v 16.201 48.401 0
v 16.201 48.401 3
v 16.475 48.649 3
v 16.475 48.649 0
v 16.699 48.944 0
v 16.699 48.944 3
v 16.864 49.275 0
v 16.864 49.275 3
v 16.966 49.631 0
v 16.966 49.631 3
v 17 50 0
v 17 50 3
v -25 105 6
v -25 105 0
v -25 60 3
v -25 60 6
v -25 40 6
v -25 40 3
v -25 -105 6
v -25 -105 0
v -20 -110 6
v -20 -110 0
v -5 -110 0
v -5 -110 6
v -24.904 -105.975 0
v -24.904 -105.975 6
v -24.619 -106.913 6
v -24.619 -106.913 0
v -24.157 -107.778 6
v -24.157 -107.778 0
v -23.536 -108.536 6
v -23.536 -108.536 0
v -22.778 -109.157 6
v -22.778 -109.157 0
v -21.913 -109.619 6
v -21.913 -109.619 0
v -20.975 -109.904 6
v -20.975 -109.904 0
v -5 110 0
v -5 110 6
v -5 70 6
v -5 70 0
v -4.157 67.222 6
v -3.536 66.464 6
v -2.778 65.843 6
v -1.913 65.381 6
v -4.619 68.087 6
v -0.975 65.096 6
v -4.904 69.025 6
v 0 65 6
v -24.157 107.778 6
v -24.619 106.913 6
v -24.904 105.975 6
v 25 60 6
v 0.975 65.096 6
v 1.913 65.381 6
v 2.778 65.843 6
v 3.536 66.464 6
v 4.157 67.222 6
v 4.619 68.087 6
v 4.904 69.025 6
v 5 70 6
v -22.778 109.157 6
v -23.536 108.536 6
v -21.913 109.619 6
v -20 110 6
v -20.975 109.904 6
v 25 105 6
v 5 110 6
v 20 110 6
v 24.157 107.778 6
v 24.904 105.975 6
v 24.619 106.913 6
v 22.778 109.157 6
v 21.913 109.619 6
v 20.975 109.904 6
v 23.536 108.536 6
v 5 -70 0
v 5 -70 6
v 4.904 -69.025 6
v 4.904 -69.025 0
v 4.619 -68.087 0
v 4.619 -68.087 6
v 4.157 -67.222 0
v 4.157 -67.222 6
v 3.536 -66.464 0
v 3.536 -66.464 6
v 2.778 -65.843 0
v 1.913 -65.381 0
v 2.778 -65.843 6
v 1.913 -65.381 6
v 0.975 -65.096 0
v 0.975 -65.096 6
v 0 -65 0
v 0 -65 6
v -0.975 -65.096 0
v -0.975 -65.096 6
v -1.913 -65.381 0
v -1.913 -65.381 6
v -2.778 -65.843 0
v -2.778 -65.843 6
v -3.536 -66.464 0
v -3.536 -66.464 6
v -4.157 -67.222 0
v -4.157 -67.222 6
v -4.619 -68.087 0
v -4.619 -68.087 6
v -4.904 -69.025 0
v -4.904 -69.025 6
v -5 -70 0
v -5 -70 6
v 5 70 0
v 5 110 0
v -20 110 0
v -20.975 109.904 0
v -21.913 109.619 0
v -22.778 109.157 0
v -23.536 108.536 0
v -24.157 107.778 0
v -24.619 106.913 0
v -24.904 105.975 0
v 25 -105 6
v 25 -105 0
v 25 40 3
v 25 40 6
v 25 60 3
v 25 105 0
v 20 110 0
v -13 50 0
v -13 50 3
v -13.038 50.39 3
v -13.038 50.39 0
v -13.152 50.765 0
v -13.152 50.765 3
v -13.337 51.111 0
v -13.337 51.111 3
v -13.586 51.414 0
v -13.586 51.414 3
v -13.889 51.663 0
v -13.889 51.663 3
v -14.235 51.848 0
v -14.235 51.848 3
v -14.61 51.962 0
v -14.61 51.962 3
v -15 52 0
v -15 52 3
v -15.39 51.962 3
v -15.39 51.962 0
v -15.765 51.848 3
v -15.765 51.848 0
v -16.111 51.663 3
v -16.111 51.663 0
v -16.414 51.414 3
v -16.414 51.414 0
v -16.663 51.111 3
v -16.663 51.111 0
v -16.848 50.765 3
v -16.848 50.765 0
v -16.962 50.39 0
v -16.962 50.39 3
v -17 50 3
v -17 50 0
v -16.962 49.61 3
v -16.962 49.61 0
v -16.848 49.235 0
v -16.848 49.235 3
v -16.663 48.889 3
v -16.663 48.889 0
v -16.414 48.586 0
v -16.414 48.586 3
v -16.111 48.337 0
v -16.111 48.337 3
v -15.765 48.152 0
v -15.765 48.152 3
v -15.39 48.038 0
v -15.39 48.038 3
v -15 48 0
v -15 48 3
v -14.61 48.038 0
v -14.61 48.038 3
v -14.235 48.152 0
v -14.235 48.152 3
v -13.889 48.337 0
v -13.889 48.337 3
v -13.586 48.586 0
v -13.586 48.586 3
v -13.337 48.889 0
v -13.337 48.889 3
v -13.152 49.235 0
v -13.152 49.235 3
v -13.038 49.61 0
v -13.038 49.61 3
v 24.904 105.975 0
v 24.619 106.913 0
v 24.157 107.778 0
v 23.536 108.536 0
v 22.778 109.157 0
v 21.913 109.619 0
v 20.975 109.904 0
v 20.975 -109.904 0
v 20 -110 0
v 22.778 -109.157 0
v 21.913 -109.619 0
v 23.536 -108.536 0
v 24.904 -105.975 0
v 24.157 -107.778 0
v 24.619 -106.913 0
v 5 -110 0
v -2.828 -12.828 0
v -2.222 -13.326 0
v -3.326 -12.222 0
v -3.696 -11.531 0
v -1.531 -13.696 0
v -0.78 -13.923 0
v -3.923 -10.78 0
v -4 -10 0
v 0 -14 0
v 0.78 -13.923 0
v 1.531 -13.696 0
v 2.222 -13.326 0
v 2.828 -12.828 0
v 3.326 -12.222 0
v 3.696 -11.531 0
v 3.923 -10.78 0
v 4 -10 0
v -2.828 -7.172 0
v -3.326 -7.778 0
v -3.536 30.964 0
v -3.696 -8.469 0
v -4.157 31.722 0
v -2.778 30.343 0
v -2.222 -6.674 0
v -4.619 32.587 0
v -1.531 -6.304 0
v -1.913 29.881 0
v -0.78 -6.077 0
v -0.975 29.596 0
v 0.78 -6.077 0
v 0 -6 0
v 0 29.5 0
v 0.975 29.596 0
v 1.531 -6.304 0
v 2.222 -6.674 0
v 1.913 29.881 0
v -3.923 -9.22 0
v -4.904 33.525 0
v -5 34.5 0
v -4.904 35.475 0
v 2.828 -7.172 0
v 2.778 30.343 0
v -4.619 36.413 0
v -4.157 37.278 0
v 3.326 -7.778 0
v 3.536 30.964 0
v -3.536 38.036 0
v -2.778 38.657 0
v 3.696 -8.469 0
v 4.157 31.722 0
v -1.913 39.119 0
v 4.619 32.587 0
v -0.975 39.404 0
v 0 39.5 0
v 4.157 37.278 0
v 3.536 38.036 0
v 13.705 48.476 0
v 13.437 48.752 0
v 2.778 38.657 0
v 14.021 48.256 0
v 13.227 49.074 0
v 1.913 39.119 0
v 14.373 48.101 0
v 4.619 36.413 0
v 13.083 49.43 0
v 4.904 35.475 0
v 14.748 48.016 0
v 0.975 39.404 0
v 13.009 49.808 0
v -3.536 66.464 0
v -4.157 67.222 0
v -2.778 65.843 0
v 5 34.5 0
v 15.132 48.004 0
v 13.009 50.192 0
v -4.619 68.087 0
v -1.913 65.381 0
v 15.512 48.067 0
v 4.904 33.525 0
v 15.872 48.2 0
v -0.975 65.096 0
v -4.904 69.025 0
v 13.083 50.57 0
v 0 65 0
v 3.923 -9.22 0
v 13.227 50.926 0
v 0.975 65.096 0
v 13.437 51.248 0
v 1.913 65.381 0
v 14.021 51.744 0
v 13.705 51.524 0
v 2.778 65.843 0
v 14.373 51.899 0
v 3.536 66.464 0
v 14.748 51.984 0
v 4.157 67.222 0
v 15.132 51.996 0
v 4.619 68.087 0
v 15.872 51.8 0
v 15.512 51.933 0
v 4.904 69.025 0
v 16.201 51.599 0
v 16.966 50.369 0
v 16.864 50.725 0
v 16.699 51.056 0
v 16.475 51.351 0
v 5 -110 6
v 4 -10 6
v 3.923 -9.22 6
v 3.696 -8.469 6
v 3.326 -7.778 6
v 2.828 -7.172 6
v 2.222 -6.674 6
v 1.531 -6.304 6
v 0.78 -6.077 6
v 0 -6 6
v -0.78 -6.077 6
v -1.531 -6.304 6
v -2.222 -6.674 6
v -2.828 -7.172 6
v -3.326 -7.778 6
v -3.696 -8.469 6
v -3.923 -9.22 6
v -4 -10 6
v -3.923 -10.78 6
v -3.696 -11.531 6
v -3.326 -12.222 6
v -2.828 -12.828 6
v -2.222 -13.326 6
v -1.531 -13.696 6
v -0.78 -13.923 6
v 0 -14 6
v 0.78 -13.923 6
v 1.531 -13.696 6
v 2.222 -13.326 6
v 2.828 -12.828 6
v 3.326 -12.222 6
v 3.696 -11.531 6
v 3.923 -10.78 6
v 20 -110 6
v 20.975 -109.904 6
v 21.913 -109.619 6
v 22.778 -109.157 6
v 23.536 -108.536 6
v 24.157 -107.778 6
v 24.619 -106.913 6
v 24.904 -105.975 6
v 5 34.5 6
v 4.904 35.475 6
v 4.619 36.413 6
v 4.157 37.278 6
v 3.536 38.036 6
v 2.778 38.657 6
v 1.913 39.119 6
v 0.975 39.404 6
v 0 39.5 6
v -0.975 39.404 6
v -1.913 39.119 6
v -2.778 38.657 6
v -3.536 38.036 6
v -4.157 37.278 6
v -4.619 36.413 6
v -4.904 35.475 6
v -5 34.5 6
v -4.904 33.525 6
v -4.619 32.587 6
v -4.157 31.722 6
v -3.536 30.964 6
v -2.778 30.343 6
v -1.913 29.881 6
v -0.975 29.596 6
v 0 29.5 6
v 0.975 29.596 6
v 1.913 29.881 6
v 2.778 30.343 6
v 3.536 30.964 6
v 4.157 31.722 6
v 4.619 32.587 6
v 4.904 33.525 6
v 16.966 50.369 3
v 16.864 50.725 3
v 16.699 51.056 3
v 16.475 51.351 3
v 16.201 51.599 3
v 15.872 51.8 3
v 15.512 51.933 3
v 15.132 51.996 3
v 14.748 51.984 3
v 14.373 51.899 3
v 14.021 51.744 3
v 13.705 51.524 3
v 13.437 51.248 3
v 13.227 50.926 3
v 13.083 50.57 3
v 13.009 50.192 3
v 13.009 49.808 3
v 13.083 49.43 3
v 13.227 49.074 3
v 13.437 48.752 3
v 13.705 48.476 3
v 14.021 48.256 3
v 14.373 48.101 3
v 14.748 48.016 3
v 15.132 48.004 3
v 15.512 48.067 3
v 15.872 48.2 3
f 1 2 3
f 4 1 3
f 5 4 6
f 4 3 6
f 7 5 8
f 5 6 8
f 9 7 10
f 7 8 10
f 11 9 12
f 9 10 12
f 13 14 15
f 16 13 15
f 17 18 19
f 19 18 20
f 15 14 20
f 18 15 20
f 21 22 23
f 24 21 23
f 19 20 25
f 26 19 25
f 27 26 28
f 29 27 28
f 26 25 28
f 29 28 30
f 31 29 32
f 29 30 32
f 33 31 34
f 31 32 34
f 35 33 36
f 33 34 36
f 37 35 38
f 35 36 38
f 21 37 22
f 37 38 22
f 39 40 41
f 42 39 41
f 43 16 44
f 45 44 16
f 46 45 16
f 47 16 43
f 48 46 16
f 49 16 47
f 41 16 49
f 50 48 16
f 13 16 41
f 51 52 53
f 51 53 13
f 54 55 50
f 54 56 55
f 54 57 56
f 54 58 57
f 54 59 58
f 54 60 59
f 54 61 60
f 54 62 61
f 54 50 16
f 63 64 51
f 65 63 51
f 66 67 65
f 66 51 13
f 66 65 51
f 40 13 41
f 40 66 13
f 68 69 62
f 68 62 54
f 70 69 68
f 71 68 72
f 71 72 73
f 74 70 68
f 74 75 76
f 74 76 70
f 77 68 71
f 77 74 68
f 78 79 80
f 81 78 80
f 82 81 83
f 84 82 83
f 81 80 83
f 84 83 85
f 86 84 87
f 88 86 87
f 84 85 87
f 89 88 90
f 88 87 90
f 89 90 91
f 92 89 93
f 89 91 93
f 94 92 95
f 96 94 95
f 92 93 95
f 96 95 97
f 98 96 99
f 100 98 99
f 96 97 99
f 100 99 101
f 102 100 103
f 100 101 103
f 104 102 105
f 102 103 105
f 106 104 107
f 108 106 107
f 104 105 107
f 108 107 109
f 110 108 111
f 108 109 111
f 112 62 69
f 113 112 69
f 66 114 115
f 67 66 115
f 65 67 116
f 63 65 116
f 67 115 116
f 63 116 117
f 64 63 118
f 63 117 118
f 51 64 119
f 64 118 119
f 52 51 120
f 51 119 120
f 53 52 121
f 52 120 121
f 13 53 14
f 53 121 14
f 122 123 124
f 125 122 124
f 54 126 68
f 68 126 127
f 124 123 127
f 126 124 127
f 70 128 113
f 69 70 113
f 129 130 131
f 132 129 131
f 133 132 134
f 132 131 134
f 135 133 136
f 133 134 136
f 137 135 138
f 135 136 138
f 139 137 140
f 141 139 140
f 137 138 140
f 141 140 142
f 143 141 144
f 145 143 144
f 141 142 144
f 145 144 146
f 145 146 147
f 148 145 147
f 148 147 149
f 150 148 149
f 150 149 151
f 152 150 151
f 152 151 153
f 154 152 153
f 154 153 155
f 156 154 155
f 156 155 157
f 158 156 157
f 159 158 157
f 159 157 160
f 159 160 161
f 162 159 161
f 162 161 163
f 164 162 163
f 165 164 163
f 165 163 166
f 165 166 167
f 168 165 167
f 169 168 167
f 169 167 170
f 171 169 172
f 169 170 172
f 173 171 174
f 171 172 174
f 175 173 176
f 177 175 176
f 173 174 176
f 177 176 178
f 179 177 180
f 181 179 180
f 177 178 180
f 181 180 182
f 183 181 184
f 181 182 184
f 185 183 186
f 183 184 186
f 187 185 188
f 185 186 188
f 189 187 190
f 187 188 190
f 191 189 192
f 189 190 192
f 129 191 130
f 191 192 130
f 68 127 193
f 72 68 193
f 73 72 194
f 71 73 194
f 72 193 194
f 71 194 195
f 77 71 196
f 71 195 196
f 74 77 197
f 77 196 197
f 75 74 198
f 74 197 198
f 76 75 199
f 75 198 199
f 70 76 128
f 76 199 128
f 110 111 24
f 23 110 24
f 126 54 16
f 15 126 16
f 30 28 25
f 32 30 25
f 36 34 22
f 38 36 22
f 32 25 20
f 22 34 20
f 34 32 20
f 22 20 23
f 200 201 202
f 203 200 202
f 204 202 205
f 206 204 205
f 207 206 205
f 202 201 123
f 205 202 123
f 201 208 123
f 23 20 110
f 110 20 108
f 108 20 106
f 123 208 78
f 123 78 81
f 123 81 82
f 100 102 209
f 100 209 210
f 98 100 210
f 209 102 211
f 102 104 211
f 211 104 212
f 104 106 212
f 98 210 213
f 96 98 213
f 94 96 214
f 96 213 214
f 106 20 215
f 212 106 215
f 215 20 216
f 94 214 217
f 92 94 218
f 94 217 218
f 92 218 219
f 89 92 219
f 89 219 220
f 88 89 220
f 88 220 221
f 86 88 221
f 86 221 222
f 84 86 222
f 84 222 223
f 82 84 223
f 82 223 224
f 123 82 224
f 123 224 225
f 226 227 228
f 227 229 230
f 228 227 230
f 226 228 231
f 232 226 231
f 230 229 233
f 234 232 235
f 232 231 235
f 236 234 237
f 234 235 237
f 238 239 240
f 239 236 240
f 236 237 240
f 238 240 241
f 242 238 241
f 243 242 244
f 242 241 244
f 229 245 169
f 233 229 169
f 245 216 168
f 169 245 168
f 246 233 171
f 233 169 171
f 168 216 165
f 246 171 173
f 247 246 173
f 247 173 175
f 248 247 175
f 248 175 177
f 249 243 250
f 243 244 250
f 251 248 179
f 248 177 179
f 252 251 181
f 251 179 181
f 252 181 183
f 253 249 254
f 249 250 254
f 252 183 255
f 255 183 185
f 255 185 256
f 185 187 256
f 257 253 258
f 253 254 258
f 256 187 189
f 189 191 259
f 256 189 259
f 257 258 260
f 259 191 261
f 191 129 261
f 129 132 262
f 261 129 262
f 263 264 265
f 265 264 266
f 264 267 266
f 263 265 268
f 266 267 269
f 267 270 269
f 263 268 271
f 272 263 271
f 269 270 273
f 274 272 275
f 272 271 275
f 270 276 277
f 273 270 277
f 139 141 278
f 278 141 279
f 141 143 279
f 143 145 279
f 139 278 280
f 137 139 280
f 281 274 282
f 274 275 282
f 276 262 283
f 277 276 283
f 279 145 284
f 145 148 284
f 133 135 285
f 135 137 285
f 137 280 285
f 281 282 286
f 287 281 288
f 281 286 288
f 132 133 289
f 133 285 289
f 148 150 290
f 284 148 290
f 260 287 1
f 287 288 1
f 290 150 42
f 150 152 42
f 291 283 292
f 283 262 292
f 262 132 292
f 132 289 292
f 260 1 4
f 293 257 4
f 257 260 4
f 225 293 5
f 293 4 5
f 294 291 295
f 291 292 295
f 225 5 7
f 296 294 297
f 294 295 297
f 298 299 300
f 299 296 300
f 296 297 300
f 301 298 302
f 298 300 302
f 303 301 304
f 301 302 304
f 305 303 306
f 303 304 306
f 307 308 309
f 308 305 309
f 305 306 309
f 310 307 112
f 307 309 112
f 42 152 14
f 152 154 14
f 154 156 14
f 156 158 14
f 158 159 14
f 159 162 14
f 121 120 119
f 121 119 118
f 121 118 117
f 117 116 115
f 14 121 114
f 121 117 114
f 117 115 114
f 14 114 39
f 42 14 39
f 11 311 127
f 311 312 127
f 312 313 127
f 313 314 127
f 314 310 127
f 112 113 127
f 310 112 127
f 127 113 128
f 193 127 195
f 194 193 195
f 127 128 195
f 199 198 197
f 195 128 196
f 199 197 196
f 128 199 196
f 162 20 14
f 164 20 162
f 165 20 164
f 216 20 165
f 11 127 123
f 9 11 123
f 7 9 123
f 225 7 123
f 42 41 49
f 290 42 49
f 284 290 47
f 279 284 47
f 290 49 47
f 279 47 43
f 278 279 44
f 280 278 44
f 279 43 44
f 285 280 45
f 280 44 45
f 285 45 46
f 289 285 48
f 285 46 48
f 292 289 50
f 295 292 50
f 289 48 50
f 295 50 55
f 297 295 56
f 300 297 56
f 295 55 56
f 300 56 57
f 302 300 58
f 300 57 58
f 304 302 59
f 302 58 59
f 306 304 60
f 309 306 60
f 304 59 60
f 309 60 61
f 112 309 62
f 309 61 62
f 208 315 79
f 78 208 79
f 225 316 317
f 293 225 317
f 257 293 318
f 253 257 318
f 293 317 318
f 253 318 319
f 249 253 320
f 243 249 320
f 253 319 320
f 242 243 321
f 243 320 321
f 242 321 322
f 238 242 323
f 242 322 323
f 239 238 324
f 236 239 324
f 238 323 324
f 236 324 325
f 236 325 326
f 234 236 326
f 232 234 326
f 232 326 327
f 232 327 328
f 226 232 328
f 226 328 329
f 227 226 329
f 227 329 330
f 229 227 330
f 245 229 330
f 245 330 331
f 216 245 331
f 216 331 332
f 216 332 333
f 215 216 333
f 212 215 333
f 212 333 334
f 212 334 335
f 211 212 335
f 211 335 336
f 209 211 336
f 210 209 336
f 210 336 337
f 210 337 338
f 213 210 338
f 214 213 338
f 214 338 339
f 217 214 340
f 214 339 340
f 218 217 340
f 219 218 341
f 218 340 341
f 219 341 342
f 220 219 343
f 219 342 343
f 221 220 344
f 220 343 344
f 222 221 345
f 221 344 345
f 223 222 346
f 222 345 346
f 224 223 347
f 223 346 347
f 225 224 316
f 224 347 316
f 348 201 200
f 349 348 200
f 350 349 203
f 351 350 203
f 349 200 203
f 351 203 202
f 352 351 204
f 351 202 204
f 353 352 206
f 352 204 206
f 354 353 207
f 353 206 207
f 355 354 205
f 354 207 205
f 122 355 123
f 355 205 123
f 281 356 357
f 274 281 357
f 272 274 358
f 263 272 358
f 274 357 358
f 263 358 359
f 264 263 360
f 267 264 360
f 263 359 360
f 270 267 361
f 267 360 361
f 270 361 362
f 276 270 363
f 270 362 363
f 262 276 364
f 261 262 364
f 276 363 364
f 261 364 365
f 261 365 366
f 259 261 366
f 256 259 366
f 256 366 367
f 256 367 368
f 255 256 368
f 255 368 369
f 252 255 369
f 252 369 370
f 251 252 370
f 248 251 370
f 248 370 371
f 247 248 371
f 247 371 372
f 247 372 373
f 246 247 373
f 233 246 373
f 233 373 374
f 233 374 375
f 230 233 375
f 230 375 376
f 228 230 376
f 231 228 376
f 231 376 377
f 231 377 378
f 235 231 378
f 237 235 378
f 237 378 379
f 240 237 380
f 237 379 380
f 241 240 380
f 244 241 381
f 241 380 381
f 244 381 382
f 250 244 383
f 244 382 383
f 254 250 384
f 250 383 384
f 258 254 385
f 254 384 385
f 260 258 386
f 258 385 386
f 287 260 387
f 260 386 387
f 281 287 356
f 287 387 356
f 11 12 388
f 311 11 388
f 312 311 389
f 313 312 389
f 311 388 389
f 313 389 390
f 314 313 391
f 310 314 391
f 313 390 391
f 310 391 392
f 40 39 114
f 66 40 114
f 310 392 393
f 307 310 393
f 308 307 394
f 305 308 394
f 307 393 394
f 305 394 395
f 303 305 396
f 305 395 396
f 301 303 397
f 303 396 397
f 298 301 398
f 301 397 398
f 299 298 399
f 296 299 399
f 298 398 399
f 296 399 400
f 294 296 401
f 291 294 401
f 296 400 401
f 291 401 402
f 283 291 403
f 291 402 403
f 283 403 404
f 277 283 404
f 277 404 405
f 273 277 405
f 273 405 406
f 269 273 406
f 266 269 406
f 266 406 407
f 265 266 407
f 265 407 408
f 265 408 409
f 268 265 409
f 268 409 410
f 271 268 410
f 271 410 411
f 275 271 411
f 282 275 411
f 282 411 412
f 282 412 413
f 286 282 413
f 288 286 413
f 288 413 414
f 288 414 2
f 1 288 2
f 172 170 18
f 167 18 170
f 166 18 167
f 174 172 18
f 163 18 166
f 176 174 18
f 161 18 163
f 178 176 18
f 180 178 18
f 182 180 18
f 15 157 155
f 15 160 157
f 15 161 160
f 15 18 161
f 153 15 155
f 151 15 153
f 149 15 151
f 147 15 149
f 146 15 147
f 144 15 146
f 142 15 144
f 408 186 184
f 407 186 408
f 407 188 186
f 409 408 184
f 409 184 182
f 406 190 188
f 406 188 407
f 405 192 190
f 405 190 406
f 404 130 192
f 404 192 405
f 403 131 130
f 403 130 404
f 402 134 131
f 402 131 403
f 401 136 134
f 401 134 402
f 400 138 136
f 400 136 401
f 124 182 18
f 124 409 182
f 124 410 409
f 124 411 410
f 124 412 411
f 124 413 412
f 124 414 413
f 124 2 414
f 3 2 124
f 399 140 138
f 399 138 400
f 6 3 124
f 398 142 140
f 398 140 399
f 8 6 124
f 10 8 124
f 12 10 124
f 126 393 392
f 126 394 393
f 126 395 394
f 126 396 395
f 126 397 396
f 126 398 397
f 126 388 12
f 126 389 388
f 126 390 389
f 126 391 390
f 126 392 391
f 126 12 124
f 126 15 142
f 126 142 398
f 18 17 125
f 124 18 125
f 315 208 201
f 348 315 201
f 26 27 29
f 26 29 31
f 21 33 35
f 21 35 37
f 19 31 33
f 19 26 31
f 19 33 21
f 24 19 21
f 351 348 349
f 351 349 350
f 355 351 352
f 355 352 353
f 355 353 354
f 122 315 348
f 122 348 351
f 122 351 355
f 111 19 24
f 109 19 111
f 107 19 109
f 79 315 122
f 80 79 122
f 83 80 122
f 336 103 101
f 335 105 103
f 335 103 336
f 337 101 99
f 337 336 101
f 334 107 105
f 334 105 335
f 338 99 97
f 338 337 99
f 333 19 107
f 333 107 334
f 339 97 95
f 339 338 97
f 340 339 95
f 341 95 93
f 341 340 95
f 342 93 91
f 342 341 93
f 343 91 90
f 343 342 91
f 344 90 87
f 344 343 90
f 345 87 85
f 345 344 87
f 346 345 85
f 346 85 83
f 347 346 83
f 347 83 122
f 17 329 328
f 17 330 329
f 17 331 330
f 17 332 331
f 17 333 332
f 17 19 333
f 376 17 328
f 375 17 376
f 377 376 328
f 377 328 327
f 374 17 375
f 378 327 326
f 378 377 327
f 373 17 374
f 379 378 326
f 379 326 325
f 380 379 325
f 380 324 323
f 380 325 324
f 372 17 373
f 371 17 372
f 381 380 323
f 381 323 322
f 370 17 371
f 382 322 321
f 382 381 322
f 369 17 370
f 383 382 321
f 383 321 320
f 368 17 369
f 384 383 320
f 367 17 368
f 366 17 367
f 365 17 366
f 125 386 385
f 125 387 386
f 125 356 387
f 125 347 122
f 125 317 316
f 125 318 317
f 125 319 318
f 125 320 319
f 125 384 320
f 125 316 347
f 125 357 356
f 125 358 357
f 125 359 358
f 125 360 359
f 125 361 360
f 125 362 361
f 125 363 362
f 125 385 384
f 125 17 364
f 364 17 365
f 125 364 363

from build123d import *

# Parameters (mm, degrees)
F1_DEPTH = 6
F2_W     = 10
F2_H     = 12.1811708808
F2_R     = 4
F2_R_2   = 5
F2_R_3   = 2
F2_H_2   = 27.5950810313
F3_DEPTH = 25
F5_DEPTH = 3


with BuildPart() as f1:
    # F0 (on Top) → F1 (new body)
    with BuildSketch(Plane.XY):
        with BuildLine():
            Line((20, 110), (-20, 110))
            ThreePointArc((-20, 110), (-23.5355339059, 108.5355339059), (-25, 105))
            Line((-25, 105), (-25, -105))
            ThreePointArc((-25, -105), (-23.5355339059, -108.5355339059), (-20, -110))
            Line((-20, -110), (20, -110))
            ThreePointArc((20, -110), (23.5355339059, -108.5355339059), (25, -105))
            Line((25, -105), (25, 105))
            ThreePointArc((25, 105), (23.5355339059, 108.5355339059), (20, 110))
        make_face()
    extrude(amount=F1_DEPTH)

    # F2 (on face) → F3 (cut)
    with BuildSketch(Plane.XY.offset(6)):
        with Locations((0, -103.9094145596)):
            Rectangle(F2_W, F2_H)
        with BuildLine():
            Line((-5, -97.8188291192), (5, -97.8188291192))
            Line((5, -97.8188291192), (5, -70))
            ThreePointArc((5, -70), (0, -65), (-5, -70))
            Line((-5, -70), (-5, -97.8188291192))
        make_face()
        with Locations((0, -10)):
            Circle(F2_R)
        with Locations((0, 34.5)):
            Circle(F2_R_2)
        with Locations((-15, 50)):
            Circle(F2_R_3)
        with BuildLine():
            ThreePointArc((16.2007454783, 51.5994406198), (13, 50), (16.2007454783, 48.4005593802))
            Line((16.2007454783, 48.4005593802), (16.2007454783, 51.5994406198))
        make_face()
        with BuildLine():
            Line((5, 70), (5, 82.4049189687))
            Line((5, 82.4049189687), (-5, 82.4049189687))
            Line((-5, 82.4049189687), (-5, 70))
            ThreePointArc((-5, 70), (0, 65), (5, 70))
        make_face()
        with Locations((0, 96.2024594843)):
            Rectangle(F2_W, F2_H_2)
        with BuildLine():
            Line((16.2007454783, 51.5994406198), (16.2007454783, 48.4005593802))
            ThreePointArc((16.2007454783, 48.4005593802), (16.7890627374, 49.1059896412), (17, 50))
            ThreePointArc((17, 50), (16.7890627374, 50.8940103588), (16.2007454783, 51.5994406198))
        make_face()
    extrude(amount=-F3_DEPTH, mode=Mode.SUBTRACT)

    # F4 (on face) → F5 (cut)
    with BuildSketch(Plane.XY.offset(6)):
        Polygon((25, 60), (12.5, 60), (-25, 60), (-25, 40), (25, 40), align=None)
    extrude(amount=-F5_DEPTH, mode=Mode.SUBTRACT)


solid = f1.part
